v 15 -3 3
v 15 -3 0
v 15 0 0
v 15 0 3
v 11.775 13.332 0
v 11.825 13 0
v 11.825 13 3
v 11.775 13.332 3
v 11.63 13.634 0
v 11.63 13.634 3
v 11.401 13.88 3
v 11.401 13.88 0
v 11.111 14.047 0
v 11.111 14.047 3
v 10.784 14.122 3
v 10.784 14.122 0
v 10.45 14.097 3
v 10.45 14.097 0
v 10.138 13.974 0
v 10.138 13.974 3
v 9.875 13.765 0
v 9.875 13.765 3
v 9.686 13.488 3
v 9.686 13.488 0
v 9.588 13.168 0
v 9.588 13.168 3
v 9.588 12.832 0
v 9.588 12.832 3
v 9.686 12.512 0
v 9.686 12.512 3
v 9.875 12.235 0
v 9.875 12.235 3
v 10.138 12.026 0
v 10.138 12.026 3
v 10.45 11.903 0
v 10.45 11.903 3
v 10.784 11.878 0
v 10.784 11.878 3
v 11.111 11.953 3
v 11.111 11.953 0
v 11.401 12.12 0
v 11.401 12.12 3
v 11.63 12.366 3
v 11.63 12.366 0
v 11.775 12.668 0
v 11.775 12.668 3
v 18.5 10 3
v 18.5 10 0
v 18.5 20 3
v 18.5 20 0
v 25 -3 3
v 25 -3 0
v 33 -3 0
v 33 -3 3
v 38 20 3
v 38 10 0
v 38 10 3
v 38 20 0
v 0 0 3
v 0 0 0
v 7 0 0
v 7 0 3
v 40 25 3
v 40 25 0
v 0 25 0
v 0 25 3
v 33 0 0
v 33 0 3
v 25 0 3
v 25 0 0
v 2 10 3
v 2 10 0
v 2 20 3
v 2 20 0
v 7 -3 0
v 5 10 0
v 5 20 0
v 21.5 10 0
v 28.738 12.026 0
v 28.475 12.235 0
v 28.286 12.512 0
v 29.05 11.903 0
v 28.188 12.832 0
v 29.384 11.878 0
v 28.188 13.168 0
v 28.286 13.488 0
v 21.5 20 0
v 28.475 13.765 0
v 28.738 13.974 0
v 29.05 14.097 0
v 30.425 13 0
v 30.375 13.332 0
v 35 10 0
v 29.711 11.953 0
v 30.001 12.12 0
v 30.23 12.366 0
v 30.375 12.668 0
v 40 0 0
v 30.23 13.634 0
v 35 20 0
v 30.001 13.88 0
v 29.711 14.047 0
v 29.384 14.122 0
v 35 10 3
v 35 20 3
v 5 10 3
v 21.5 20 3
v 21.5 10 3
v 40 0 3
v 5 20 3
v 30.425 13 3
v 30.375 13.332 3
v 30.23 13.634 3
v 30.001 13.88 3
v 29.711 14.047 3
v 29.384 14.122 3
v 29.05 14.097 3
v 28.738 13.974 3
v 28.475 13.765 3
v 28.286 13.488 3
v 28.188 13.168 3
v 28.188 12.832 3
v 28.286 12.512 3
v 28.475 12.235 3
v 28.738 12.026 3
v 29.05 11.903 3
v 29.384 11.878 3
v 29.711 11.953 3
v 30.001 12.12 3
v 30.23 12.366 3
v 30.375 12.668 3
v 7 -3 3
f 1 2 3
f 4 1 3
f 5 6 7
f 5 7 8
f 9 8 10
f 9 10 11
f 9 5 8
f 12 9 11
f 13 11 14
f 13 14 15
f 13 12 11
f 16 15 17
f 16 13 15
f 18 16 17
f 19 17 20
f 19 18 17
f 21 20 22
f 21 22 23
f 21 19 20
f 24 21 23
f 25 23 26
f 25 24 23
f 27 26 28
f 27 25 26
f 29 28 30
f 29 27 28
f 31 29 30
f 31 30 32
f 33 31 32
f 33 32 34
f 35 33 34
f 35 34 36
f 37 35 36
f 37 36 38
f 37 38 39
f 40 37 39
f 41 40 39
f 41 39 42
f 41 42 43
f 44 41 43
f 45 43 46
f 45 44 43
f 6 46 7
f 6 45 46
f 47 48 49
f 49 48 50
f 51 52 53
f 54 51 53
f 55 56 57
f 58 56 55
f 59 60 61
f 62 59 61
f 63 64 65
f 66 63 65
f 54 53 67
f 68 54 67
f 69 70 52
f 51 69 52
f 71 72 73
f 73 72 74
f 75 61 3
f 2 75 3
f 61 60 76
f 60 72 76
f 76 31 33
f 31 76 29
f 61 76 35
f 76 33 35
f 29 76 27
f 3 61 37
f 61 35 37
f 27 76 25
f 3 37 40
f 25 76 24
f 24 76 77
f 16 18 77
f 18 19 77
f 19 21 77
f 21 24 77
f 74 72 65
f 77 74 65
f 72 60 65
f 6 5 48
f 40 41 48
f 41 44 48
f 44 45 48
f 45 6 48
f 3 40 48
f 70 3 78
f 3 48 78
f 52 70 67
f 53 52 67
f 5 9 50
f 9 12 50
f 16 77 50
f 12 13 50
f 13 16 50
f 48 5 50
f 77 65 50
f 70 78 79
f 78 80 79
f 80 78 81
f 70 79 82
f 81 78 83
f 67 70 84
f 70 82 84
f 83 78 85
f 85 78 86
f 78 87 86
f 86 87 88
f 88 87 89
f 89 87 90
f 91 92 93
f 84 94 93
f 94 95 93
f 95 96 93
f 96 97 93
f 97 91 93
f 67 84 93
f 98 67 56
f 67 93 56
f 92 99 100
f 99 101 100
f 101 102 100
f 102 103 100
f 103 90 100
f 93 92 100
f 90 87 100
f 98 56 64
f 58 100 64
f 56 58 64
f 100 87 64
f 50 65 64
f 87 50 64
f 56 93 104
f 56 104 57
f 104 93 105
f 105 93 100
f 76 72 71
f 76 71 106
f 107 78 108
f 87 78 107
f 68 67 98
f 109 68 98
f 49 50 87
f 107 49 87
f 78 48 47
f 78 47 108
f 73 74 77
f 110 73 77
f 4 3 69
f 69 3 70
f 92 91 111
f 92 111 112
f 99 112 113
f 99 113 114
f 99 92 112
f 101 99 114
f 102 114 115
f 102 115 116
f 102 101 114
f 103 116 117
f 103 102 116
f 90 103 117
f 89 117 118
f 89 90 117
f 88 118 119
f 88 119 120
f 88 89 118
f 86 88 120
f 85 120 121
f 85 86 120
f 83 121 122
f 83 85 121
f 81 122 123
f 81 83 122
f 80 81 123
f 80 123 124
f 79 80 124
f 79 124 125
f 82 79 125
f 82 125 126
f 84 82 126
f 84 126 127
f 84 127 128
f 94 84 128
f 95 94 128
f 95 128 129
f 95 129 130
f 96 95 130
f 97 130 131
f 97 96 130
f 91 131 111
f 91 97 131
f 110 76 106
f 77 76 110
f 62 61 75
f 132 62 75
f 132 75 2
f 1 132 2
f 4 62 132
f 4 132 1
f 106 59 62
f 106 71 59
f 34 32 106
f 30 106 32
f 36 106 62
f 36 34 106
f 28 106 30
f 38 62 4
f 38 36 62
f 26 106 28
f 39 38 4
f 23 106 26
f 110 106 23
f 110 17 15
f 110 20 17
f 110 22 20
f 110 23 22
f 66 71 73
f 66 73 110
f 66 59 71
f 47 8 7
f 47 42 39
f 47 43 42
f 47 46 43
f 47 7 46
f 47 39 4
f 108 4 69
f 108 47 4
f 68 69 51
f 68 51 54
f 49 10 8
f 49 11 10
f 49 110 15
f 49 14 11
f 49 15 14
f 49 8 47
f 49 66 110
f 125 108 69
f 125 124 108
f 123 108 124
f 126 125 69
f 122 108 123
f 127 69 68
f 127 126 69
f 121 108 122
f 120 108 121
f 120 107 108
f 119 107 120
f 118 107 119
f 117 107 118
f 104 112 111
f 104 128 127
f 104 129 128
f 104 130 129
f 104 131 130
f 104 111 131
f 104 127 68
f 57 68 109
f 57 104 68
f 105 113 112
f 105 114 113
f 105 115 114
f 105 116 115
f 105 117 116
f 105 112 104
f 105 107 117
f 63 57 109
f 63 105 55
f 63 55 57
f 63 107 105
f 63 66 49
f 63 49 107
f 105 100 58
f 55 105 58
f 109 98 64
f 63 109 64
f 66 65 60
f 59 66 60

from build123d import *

# Parameters (mm, degrees)
SKETCH_1_R      = 1.125
SKETCH_1_W      = 3
SKETCH_1_H      = 10
EXTRUDE_1_DEPTH = 3


with BuildPart() as part:
    # 草图1 → 凸台-拉伸1 (new body)
    with BuildSketch(Plane.XY):
        Polygon((40, 0), (40, 25), (0, 25), (0, 0), (2, 0), (5, 0), (7, 0), (7, -3), (15, -3), (15, 0), (25, 0), (25, -3), (33, -3), (33, 0), (35, 0), (38, 0), align=None)
        with Locations((10.7, 13)):
            Circle(SKETCH_1_R, mode=Mode.SUBTRACT)
        with Locations((29.3, 13)):
            Circle(SKETCH_1_R, mode=Mode.SUBTRACT)
        with Locations((3.5, 15)):
            Rectangle(SKETCH_1_W, SKETCH_1_H, mode=Mode.SUBTRACT)
        with Locations((36.5, 15)):
            Rectangle(SKETCH_1_W, SKETCH_1_H, mode=Mode.SUBTRACT)
        with Locations((20, 15)):
            Rectangle(SKETCH_1_W, SKETCH_1_H, mode=Mode.SUBTRACT)
    extrude(amount=EXTRUDE_1_DEPTH)


solid = part.part
